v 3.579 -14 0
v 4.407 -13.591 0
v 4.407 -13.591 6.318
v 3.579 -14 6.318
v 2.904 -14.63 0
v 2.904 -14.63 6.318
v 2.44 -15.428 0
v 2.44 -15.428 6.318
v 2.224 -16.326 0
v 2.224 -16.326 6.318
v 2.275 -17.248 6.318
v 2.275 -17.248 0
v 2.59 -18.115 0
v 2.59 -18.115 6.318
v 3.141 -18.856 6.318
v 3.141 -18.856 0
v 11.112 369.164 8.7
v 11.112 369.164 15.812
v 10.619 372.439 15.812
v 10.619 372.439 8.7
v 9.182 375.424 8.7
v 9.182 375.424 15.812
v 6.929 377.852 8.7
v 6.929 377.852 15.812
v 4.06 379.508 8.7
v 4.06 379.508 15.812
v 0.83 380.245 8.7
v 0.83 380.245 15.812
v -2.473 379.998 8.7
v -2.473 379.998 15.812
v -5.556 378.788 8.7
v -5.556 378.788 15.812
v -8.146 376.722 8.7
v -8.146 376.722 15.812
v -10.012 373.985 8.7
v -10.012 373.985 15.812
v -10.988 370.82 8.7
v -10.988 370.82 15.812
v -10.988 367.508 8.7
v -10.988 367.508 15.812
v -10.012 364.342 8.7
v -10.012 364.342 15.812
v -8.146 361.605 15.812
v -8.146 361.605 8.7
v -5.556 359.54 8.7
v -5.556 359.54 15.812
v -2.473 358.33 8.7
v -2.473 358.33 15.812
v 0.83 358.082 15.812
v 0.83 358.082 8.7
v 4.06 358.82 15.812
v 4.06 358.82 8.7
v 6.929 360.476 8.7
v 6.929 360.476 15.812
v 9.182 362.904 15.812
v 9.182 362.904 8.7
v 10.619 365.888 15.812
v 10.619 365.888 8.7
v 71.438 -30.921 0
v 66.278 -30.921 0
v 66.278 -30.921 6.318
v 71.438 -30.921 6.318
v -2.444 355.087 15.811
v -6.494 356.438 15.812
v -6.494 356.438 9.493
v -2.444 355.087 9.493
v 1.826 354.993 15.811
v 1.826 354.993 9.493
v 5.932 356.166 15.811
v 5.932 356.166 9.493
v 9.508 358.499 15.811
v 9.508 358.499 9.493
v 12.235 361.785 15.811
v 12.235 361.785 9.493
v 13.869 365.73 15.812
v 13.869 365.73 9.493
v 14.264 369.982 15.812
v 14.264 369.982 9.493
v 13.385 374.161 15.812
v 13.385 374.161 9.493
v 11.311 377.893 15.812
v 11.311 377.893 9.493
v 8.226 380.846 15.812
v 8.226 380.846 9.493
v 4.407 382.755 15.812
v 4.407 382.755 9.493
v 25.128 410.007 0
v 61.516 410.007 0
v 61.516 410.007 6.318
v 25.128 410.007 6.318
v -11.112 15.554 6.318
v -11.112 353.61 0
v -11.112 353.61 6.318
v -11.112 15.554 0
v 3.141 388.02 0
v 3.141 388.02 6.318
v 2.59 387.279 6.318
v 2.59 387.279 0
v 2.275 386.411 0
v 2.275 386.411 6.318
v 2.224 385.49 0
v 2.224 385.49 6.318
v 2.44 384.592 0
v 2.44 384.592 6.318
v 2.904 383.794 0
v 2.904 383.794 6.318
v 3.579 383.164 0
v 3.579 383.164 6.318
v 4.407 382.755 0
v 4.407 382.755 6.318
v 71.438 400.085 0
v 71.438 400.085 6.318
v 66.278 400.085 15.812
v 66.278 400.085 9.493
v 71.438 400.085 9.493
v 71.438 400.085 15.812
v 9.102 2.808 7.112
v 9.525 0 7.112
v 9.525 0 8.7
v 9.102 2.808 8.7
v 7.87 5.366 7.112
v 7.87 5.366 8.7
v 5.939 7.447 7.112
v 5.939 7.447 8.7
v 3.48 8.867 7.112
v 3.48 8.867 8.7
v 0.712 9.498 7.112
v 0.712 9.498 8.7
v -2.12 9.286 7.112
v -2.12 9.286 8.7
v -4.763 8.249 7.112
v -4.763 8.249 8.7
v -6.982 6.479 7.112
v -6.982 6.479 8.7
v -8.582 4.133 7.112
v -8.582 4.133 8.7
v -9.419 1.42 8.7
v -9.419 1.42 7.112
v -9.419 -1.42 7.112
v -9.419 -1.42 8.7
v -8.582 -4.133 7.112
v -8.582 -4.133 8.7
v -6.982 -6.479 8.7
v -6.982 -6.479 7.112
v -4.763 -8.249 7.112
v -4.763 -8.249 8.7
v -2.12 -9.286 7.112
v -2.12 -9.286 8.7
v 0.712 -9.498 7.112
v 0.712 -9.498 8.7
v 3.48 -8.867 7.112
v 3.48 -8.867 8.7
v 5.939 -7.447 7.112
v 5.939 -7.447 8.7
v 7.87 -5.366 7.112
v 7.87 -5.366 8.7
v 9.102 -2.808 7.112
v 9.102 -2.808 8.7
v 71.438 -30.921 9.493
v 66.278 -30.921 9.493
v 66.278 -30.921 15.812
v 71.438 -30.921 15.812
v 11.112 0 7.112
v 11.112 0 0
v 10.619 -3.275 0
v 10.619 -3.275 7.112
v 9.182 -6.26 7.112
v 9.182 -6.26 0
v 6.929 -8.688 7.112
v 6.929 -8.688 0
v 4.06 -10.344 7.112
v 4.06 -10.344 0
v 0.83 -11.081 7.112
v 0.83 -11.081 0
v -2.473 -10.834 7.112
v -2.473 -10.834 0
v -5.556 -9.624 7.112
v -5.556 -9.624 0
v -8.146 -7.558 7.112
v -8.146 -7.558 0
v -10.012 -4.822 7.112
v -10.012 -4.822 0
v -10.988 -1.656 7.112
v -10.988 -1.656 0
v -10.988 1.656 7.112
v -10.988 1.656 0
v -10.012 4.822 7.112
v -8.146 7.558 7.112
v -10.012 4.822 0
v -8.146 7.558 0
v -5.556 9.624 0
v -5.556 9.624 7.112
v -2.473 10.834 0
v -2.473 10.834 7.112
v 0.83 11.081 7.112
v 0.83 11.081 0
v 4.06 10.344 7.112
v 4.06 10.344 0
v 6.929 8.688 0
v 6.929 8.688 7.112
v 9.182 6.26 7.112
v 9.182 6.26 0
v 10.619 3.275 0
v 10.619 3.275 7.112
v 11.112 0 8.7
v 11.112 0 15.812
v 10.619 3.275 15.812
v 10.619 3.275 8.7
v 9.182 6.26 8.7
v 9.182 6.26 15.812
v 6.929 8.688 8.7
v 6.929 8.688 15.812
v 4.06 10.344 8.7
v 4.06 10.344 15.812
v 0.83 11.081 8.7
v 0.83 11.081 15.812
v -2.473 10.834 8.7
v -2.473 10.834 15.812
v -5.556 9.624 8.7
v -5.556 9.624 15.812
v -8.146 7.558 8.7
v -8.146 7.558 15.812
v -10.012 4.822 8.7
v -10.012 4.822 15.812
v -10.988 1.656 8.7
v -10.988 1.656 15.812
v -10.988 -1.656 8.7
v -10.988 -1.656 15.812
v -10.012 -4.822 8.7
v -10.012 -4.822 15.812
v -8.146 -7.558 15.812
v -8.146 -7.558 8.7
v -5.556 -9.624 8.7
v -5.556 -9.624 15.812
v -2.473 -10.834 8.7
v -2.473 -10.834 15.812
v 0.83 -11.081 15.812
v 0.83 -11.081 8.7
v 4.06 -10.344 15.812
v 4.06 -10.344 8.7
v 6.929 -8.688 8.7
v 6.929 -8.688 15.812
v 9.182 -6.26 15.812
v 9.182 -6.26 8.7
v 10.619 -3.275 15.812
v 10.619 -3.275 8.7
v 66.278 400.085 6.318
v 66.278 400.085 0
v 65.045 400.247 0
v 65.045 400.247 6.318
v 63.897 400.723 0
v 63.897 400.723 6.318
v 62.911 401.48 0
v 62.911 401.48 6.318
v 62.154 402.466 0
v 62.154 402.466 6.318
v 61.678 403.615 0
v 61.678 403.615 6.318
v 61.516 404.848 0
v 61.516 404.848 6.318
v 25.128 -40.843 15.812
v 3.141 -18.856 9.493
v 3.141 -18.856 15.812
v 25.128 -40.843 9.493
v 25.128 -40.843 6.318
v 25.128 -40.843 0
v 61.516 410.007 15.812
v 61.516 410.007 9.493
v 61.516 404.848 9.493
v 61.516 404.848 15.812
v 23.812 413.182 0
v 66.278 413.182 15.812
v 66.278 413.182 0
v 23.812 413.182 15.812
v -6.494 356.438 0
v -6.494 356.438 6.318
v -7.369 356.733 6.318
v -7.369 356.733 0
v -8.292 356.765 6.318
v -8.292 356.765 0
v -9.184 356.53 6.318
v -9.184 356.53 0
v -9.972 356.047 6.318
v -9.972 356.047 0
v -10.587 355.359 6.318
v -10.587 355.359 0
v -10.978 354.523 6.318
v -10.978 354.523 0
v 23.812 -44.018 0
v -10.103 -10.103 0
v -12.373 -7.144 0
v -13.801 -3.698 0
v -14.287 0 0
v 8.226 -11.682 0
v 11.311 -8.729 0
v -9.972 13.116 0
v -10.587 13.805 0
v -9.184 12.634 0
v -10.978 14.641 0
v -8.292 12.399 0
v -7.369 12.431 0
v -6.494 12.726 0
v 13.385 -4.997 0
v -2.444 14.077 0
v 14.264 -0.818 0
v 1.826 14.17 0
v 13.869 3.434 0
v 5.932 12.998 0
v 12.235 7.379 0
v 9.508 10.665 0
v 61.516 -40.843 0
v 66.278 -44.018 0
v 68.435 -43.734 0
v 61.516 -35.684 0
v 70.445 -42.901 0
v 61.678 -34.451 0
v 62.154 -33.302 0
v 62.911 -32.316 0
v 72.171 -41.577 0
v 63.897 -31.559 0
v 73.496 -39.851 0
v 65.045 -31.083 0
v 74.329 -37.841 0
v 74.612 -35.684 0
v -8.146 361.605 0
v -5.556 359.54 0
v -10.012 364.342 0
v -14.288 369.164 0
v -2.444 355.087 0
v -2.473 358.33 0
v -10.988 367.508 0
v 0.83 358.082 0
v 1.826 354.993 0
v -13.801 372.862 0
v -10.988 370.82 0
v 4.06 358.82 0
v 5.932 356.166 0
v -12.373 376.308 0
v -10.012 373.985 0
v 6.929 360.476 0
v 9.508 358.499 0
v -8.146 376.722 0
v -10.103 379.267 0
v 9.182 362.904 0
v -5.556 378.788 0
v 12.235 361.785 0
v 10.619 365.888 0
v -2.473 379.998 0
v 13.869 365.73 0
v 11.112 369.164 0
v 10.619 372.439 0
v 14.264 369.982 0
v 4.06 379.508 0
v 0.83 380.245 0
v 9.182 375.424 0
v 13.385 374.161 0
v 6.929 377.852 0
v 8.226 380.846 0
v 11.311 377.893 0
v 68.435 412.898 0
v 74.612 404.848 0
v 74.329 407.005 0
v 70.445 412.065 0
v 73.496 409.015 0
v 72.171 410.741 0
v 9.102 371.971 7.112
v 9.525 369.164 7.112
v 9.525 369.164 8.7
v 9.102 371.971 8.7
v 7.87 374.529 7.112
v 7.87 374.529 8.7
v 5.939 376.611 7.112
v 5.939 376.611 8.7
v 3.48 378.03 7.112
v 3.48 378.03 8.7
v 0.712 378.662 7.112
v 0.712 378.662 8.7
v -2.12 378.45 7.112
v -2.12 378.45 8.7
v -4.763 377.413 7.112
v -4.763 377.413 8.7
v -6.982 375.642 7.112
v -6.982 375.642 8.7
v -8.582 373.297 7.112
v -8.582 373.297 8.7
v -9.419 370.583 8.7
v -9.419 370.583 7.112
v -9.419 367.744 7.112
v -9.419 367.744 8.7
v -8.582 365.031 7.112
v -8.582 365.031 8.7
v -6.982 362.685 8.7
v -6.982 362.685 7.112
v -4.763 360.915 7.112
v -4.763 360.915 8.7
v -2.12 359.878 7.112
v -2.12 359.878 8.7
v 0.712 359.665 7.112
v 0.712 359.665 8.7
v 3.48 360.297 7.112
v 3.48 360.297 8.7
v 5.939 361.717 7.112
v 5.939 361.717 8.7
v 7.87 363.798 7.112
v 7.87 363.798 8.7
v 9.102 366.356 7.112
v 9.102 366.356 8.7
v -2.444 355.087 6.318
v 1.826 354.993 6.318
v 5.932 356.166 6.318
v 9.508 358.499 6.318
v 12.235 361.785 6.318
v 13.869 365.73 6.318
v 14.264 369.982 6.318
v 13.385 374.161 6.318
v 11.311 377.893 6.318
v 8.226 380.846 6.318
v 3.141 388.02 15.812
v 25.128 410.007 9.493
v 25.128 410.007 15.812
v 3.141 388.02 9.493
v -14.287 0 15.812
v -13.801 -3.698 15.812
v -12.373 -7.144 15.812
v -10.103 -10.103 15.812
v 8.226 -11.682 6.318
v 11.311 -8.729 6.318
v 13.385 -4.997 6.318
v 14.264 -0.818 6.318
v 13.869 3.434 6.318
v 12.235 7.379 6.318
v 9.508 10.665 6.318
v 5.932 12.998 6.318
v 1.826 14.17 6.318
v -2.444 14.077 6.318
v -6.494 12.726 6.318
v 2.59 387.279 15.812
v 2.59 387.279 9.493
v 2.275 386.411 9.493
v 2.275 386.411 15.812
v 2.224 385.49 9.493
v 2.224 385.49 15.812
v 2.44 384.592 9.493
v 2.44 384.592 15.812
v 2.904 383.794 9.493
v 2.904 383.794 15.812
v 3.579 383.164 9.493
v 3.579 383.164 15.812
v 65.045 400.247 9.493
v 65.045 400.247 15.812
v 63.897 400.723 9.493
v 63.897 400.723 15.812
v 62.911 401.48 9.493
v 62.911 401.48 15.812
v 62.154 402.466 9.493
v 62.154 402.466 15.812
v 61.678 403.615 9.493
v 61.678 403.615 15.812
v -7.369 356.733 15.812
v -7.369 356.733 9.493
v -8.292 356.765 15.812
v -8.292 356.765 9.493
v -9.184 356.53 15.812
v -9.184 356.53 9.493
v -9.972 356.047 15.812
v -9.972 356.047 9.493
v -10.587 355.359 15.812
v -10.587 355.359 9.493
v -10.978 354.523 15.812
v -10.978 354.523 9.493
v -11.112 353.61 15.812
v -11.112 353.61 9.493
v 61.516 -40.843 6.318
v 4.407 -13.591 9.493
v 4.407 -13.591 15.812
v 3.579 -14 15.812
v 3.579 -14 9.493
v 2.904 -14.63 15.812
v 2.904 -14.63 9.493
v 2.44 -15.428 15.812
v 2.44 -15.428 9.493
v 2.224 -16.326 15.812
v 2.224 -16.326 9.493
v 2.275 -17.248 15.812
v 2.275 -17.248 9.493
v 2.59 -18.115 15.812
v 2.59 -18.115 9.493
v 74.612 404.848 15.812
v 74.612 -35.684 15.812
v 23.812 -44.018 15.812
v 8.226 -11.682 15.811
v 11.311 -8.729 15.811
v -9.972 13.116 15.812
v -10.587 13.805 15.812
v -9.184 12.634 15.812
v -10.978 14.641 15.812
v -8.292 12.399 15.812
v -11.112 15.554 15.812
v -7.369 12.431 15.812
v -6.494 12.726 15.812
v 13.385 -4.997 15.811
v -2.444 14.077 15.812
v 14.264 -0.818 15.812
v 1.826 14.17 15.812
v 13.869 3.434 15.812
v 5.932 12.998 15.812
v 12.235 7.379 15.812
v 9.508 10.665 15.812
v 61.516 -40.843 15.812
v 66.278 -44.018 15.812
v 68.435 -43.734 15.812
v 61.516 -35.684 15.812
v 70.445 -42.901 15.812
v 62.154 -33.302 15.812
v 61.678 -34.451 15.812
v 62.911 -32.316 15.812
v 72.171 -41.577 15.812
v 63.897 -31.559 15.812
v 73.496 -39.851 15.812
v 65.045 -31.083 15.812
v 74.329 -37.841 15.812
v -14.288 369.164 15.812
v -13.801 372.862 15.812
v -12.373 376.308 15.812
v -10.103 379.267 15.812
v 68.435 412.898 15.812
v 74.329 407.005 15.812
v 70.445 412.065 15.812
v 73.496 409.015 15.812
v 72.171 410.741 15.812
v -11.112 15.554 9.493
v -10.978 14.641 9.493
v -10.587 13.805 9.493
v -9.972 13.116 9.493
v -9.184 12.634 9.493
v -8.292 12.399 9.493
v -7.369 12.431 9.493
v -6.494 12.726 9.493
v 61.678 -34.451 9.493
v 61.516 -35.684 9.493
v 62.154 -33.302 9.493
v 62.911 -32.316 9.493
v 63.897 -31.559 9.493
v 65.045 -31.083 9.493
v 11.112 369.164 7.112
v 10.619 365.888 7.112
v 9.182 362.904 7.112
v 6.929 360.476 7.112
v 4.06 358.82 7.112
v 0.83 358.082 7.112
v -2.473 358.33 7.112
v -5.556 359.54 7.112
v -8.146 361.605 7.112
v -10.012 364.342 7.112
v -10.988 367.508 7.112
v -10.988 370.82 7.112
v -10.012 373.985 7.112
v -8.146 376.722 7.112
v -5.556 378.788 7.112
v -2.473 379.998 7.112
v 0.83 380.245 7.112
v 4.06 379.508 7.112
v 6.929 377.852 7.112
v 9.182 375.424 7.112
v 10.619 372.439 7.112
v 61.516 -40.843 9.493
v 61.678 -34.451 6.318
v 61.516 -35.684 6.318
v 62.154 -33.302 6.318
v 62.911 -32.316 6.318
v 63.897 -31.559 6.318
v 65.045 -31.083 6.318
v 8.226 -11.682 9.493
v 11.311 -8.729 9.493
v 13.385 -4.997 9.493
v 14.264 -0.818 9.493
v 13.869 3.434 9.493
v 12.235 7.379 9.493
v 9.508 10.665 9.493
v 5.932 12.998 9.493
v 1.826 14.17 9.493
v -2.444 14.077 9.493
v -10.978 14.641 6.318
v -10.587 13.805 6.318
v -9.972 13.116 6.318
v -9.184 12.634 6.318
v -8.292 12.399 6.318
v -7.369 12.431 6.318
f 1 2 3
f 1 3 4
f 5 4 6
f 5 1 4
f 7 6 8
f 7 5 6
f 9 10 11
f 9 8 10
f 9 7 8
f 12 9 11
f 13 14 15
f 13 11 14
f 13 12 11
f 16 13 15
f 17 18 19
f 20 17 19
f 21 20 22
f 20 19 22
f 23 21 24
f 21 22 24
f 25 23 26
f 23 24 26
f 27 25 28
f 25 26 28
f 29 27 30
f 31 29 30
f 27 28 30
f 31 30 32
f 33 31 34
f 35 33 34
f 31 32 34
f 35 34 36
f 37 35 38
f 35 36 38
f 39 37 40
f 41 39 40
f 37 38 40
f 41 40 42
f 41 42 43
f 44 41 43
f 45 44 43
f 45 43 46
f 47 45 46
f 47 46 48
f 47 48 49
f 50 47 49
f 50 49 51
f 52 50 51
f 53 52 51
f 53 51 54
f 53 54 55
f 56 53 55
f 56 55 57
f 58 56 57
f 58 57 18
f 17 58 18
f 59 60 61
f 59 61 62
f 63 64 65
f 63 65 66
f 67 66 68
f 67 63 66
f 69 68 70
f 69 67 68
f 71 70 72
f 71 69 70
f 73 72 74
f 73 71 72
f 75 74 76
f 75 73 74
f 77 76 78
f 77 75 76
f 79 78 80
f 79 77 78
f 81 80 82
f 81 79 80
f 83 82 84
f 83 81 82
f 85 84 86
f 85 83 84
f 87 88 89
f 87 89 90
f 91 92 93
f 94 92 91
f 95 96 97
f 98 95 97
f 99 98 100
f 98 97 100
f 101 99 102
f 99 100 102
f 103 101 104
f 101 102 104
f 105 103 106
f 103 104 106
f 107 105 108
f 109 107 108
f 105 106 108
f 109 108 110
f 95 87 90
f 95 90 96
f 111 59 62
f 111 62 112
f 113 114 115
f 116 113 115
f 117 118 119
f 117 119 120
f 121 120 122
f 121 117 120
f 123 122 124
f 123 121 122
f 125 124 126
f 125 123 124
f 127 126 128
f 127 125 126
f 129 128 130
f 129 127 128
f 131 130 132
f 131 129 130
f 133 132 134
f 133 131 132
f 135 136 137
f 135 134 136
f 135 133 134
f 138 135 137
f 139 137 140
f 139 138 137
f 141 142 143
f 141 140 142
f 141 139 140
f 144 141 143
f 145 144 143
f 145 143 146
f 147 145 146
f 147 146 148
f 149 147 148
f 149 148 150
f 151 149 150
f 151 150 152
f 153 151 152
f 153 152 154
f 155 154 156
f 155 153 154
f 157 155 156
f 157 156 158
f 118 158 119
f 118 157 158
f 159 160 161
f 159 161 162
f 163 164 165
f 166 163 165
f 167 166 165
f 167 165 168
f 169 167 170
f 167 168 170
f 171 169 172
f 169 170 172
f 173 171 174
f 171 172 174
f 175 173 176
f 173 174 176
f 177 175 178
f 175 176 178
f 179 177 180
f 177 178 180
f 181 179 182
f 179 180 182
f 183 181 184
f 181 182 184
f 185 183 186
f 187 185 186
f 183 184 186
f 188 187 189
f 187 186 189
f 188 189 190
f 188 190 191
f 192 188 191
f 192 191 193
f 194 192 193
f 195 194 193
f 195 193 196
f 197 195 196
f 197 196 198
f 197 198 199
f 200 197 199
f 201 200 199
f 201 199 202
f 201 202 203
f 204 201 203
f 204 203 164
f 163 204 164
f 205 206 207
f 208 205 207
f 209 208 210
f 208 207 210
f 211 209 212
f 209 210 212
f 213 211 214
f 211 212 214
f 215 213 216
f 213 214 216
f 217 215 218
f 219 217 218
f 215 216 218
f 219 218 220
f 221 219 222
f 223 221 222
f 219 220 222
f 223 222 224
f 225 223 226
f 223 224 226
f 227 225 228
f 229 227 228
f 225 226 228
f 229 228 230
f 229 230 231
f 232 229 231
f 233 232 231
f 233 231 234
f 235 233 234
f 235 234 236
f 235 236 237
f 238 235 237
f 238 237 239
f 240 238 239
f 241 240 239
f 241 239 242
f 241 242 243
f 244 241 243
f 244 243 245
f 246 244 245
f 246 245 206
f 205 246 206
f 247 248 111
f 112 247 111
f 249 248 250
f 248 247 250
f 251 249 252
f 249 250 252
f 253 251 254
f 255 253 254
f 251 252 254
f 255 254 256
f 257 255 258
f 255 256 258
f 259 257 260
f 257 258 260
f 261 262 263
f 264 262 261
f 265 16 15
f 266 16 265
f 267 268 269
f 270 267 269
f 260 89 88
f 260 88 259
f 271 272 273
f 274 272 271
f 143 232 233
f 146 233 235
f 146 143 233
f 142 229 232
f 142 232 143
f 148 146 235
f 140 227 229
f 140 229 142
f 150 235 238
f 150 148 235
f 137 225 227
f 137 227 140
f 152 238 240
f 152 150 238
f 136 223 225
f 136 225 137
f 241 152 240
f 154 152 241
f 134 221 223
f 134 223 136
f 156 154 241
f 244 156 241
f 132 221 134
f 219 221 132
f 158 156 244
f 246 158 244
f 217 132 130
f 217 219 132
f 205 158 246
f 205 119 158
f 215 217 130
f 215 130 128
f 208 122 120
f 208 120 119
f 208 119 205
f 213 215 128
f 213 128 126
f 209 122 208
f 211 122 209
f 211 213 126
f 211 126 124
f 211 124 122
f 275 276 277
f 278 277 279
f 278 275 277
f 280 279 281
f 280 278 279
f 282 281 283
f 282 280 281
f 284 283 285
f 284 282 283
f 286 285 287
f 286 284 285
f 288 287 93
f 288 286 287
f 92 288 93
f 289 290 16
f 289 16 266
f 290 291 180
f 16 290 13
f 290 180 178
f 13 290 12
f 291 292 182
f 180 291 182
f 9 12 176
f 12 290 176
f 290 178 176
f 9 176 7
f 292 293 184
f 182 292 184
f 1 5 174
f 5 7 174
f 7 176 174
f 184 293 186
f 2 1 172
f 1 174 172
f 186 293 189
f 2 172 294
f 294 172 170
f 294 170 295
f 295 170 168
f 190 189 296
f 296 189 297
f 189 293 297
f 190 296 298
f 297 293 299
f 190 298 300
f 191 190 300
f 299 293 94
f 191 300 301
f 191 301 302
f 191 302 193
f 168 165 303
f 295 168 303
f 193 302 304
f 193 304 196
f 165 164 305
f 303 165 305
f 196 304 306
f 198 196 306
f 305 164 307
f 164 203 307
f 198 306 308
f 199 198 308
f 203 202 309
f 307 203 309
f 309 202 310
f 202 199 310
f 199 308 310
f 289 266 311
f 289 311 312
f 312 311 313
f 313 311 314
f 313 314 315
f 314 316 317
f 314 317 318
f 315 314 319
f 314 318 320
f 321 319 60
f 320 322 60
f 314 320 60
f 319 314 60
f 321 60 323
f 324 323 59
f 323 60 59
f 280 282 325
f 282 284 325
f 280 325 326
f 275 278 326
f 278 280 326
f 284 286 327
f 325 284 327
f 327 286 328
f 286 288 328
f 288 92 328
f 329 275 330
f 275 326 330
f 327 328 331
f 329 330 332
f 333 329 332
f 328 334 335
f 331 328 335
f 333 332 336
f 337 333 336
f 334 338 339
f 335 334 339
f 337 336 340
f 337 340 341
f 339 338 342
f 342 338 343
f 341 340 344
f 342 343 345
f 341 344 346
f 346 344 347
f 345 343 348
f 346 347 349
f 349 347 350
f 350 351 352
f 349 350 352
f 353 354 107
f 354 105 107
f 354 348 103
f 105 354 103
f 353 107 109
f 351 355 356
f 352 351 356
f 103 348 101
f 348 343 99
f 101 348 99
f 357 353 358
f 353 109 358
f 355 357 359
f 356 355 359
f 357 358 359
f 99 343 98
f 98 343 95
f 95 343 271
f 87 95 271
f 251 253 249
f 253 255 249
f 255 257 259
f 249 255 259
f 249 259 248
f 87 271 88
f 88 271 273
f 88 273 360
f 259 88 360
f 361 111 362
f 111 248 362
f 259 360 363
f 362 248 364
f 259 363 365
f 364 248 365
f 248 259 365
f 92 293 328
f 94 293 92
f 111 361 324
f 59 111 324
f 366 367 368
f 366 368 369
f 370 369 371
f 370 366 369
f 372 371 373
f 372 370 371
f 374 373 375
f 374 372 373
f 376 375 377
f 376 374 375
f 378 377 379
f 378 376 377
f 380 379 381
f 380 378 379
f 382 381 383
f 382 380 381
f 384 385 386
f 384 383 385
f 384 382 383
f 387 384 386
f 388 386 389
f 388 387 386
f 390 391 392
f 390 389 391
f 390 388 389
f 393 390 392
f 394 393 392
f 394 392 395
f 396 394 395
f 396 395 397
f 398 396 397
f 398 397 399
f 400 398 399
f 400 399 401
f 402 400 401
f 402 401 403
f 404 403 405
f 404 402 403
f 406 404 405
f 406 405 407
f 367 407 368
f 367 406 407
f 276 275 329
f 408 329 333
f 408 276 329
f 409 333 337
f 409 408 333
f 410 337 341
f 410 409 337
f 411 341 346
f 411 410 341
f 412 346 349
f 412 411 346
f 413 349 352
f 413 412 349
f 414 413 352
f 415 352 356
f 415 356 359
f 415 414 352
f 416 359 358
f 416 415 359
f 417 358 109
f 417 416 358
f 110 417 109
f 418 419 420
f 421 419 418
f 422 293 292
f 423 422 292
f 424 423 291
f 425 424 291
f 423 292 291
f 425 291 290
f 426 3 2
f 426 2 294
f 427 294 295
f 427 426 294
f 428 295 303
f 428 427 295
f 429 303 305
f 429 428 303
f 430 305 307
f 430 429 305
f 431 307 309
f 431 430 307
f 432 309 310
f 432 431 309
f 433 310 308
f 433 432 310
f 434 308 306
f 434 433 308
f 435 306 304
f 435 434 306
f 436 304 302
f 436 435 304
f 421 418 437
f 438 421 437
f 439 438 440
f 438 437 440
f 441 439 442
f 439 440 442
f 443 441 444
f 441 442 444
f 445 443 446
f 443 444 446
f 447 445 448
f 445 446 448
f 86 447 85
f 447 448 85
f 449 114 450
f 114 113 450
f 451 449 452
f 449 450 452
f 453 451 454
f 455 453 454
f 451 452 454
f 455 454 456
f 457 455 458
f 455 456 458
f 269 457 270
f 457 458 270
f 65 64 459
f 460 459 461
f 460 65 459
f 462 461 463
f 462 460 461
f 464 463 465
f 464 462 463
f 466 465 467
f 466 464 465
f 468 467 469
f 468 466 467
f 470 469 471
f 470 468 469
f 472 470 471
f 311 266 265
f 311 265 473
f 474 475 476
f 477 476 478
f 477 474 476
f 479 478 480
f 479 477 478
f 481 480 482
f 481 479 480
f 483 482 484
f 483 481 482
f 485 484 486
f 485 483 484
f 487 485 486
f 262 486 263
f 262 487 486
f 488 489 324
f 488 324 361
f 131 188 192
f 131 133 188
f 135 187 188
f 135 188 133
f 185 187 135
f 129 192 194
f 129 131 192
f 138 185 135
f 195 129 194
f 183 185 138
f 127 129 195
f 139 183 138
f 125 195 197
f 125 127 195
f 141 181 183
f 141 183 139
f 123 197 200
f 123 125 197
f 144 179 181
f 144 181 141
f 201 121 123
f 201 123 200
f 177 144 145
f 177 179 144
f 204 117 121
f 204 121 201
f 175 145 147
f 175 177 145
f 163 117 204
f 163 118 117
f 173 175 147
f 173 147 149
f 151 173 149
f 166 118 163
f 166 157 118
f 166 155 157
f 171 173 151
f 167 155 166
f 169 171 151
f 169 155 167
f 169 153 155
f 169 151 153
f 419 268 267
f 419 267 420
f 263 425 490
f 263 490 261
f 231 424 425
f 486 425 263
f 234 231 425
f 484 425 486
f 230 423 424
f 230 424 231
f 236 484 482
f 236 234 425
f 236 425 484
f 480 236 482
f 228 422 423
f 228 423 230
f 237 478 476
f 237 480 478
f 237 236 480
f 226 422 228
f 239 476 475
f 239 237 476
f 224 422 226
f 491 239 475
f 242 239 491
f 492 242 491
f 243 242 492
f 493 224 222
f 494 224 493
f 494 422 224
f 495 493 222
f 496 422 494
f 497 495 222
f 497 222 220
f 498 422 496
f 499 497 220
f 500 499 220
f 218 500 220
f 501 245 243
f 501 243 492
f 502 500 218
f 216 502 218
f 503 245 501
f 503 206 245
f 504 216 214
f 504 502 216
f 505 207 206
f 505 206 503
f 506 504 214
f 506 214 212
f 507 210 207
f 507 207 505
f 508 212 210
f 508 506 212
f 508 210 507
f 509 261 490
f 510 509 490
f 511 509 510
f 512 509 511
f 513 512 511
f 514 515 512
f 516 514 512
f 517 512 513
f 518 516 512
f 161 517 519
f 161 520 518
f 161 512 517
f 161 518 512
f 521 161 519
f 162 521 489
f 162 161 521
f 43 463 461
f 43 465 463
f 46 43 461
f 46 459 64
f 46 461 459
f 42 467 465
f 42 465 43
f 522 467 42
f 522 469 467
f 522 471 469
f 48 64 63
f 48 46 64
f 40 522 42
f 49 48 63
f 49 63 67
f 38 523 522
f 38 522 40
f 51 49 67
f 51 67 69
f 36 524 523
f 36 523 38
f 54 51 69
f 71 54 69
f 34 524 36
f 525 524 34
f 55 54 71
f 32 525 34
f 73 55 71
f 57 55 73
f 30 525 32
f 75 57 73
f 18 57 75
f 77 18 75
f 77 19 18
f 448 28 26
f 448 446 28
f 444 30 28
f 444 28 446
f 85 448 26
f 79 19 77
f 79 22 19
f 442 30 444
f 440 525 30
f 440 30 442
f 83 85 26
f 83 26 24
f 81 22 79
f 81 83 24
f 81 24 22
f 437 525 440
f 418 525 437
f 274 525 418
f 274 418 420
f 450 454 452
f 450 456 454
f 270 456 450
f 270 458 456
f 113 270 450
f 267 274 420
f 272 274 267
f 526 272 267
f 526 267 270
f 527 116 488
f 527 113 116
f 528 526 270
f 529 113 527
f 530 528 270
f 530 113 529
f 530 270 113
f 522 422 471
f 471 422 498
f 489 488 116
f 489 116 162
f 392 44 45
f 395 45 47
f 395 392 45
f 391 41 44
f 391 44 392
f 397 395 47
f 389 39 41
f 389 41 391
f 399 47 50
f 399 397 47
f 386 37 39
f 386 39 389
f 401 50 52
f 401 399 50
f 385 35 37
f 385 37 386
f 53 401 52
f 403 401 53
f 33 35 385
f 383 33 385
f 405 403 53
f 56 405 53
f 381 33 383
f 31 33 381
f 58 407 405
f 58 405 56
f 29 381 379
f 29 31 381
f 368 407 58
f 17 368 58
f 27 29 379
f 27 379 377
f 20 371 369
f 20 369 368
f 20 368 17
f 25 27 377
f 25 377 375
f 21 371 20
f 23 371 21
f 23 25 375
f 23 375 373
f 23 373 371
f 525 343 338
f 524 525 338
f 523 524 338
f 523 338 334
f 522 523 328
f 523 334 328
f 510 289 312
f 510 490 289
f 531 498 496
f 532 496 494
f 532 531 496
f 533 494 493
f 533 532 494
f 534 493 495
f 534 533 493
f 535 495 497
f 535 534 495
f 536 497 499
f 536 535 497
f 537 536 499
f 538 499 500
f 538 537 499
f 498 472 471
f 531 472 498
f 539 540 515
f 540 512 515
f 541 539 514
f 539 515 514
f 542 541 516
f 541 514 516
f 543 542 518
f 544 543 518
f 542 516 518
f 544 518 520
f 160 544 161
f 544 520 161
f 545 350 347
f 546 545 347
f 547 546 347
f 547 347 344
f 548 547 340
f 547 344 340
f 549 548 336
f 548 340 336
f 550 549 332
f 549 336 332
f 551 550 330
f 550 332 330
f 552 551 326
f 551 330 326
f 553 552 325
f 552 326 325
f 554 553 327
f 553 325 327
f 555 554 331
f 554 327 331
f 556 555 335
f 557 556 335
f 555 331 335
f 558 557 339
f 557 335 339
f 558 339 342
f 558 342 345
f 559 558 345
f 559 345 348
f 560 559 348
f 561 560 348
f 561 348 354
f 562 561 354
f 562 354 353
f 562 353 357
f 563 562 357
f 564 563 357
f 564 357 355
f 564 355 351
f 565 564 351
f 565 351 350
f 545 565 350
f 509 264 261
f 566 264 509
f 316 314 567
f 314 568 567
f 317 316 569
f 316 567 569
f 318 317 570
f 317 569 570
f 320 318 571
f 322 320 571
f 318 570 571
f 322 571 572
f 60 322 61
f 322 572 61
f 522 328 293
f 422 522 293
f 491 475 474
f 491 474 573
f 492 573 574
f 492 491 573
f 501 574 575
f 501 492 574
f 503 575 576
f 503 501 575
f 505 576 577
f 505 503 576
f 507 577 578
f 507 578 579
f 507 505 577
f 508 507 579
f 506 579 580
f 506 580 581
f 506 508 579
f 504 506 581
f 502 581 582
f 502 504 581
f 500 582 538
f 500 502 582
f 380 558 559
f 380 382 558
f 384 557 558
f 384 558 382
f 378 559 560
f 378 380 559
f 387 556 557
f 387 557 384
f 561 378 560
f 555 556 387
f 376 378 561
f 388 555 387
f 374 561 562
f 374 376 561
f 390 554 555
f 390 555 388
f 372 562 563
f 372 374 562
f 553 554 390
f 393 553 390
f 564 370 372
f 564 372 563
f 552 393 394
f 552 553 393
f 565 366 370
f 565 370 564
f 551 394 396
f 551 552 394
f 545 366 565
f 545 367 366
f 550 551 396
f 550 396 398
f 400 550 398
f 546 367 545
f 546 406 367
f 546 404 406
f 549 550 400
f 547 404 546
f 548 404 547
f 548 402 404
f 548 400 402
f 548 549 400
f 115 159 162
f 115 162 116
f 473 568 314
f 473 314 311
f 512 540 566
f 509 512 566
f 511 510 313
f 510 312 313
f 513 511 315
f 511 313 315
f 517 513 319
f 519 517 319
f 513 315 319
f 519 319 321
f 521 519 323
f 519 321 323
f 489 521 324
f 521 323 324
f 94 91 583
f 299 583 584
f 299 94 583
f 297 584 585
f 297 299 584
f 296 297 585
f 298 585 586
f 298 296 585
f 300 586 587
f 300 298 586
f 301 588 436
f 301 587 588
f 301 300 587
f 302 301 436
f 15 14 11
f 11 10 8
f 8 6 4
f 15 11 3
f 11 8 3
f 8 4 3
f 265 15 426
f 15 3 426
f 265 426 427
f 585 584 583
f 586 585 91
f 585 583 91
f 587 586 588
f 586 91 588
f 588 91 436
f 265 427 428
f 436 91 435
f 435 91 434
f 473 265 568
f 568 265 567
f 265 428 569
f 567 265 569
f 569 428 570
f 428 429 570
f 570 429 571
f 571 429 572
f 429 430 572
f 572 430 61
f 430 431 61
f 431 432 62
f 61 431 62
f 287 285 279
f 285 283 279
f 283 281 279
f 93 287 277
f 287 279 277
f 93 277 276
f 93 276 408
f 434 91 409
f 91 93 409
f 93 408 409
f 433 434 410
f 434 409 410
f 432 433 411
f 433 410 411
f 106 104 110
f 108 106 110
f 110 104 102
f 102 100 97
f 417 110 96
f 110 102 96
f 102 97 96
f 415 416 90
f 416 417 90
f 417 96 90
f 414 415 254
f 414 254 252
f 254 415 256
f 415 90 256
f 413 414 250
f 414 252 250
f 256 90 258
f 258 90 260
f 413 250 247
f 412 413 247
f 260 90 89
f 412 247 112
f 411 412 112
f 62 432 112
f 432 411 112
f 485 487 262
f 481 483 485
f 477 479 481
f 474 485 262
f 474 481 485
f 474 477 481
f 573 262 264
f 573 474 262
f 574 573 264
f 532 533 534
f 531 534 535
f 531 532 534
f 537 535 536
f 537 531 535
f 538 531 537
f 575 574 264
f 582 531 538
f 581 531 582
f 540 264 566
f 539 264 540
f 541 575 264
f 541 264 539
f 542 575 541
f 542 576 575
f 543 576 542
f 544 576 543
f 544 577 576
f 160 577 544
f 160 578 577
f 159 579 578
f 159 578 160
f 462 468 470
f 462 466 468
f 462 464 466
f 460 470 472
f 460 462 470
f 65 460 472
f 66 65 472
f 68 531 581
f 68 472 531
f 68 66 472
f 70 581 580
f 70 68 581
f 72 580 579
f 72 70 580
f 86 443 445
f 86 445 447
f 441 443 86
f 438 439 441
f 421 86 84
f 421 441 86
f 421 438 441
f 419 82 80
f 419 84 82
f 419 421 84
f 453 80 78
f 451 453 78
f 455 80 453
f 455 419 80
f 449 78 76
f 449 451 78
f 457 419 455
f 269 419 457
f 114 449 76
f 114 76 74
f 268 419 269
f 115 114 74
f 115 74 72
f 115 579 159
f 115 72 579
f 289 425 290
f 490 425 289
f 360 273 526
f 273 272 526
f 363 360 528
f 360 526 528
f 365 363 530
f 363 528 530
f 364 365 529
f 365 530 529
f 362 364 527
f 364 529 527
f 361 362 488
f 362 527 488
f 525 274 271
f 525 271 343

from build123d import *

# Parameters (mm, degrees)
F0_R      = 9.525
F1_DEPTH  = 15.8115
F2_R      = 11.1125
F3_DEPTH  = 7.112
F4_R      = 11.1125
F5_DEPTH  = 7.112
F6_T      = 3.175
F7_R      = 3.175
F8_DEPTH  = 3.175
F10_R     = 11.1125
F11_DEPTH = 1.5875
F12_W     = 13.096875
F12_H     = 13.096875
F13_DEPTH = 15.8115
F14_R     = 4.7625
F15_R     = 8.334375


# Not quite as in the source:
# - a shell that OpenCascade refuses in one call is made with other operations: the cavity is built on its own and cut out


with BuildPart() as f1:
    # F0 (on Top) → F1 (new body)
    with BuildSketch(Plane.XY):
        with BuildLine():
            Line((-14.2875, 369.1638474552), (-14.2875, 0))
            ThreePointArc((-14.2875, 0), (-13.1999288208, -5.4675895399), (-10.1027881362, -10.1027881362))
            Line((-10.1027881362, -10.1027881362), (23.8125, -44.0180762724))
            Line((23.8125, -44.0180762724), (74.6125, -44.0180762724))
            Line((74.6125, -44.0180762724), (74.6125, 413.1819237276))
            Line((74.6125, 413.1819237276), (23.8125, 413.1819237276))
            Line((23.8125, 413.1819237276), (-10.1027881362, 379.2666355914))
            ThreePointArc((-10.1027881362, 379.2666355914), (-13.1999288208, 374.6314369951), (-14.2875, 369.1638474552))
        make_face()
        Circle(F0_R, mode=Mode.SUBTRACT)
        with Locations((0, 369.1638474552)):
            Circle(F0_R, mode=Mode.SUBTRACT)
    extrude(amount=F1_DEPTH)

    # F2 (on face) → F3 (cut)
    with BuildSketch(Plane.XY.offset(15.8115)):
        with Locations((0, 369.1638474552)):
            Circle(F2_R)
        Circle(F2_R)
    extrude(amount=-F3_DEPTH, mode=Mode.SUBTRACT)

    # F4 (on face) → F5 (cut)
    with BuildSketch(Plane(origin=(0, 0, 0), x_dir=(1, 0, 0), z_dir=(0, 0, -1))):
        Circle(F4_R)
        with Locations((0, -369.1638474552)):
            Circle(F4_R)
    extrude(amount=-F5_DEPTH, mode=Mode.SUBTRACT)

    # F6: shell of thickness 3.175, made by hand


with BuildPart() as f6_core1:
    # F6_t2: copy of F1
    add(f1.part)

    # the walls: a layer under each face that stays
    f6_faces = [f6_core1.faces().sort_by_distance(p)[0] for p in [
        (-13.1999288208, 374.6314369951, 7.90575),
        (6.8548559319, 396.2242796595, 7.90575),
        (-14.2875, 184.5819237276, 7.90575),
        (30.1625, 184.5819237276, 15.8115),
        (49.2125, 413.1819237276, 7.90575),
        (-13.1999288208, -5.4675895399, 7.90575),
        (74.6125, 184.5819237276, 7.90575),
        (6.8548559319, -27.0604322043, 7.90575),
        (49.2125, -44.0180762724, 7.90575),
        (-11.1125, 0, 3.556),
        (-11.1125, 369.1638474552, 3.556),
        (-11.1125, 0, 12.2555),
        (-11.1125, 369.1638474552, 12.2555),
        (-7.4083333333, 7.4083333333, 7.112),
        (-7.4083333333, 376.5721807885, 7.112),
        (-7.4083333333, -7.4083333333, 8.6995),
        (-7.4083333333, 361.7555141219, 8.6995),
        (-9.525, 0, 7.90575),
        (-9.525, 369.1638474552, 7.90575),
    ]]
    thicken(f6_faces, amount=-F6_T, mode=Mode.SUBTRACT)

    # F6_s3 → F6_t4 (revolve, cut)
    with BuildSketch(Plane.XZ):
        Polygon((11.08075, 7.08025), (14.2875, 7.112), (14.2875, 10.287), (11.1125, 10.287), align=None)
    revolve(axis=Axis((0, 0, 7.112), (0, 0, -1)), mode=Mode.SUBTRACT)

    # F6_s5 → F6_t6 (revolve, cut)
    with BuildSketch(Plane.XZ.offset(-369.1638474552)):
        Polygon((11.08075, 7.08025), (14.2875, 7.112), (14.2875, 10.287), (11.1125, 10.287), align=None)
    revolve(axis=Axis((0, 369.1638474552, 7.112), (0, 0, -1)), mode=Mode.SUBTRACT)

    # F6_s7 → F6_t8 (revolve, cut)
    with BuildSketch(Plane.XZ):
        Polygon((11.08075, 8.73125), (14.2875, 8.6995), (14.2875, 5.5245), (11.1125, 5.5245), align=None)
    revolve(axis=Axis((0, 0, 8.6995), (0, 0, 1)), mode=Mode.SUBTRACT)

    # F6_s9 → F6_t10 (revolve, cut)
    with BuildSketch(Plane.XZ.offset(-369.1638474552)):
        Polygon((11.08075, 8.73125), (14.2875, 8.6995), (14.2875, 5.5245), (11.1125, 5.5245), align=None)
    revolve(axis=Axis((0, 369.1638474552, 8.6995), (0, 0, 1)), mode=Mode.SUBTRACT)


with BuildPart() as f1_1:
    add(f1.part)

    # what is left inside the walls is the cavity
    f6_cavity = [f6_core1.part.solids().sort_by_distance(p)[0] for p in [
        (30.1625, 109.440257, 12.60475),
    ]]
    add(f6_cavity, mode=Mode.SUBTRACT)

    # F7
    f7_edges = [f1_1.edges().sort_by_distance(p)[0] for p in [
        (-1.507724, 383.371572, 6.31825),
        (-11.1125, 360.183591, 6.31825),
        (-11.1125, 8.980256, 6.31825),
        (-1.507724, -14.207724, 6.31825),
    ]]
    fillet(f7_edges, radius=F7_R)

    # F8 (cut, through all): a face of the model
    f8_faces = [f1_1.faces().sort_by_distance(p)[0] for p in [
        (32.2546535053, 184.5819237276, 12.6365),
    ]]
    extrude(f8_faces, amount=-F8_DEPTH, mode=Mode.SUBTRACT)

    # F10 (on offset) → F11 (join, symmetric)
    with BuildSketch(Plane.XY.offset(7.90575)):
        with BuildLine():
            Line((74.6125, -44.0180762724), (74.6125, 413.1819237276))
            Line((74.6125, 413.1819237276), (23.8125, 413.1819237276))
            Line((23.8125, 413.1819237276), (-10.1027881362, 379.2666355914))
            ThreePointArc((-10.1027881362, 379.2666355914), (-13.1999288208, 374.6314369951), (-14.2875, 369.1638474552))
            Line((-14.2875, 369.1638474552), (-14.2875, 0))
            ThreePointArc((-14.2875, 0), (-13.1999288208, -5.4675895399), (-10.1027881362, -10.1027881362))
            Line((-10.1027881362, -10.1027881362), (23.8125, -44.0180762724))
            Line((23.8125, -44.0180762724), (74.6125, -44.0180762724))
        make_face()
        Circle(F10_R, mode=Mode.SUBTRACT)
        with Locations((0, 369.1638474552)):
            Circle(F10_R, mode=Mode.SUBTRACT)
    extrude(amount=F11_DEPTH, both=True)

    # F12 (on face) → F13 (join, through all)
    with BuildSketch(Plane(origin=(0, 0, 0), x_dir=(1, 0, 0), z_dir=(0, 0, -1))):
        with Locations((68.0640625, -406.6334862276)):
            Rectangle(F12_W, F12_H)
        with Locations((68.0640625, 37.4696387724)):
            Rectangle(F12_W, F12_H)
    extrude(amount=-F13_DEPTH)

    # F14
    f14_edges = [f1_1.edges().sort_by_distance(p)[0] for p in [
        (61.515625, 400.085049, 12.652375),
        (61.515625, 400.085049, 3.159125),
        (61.515625, -30.921201, 12.652375),
        (61.515625, -30.921201, 3.159125),
    ]]
    fillet(f14_edges, radius=F14_R)

    # F15
    f15_edges = [f1_1.edges().sort_by_distance(p)[0] for p in [
        (74.6125, -44.018076, 7.90575),
        (74.6125, 413.181924, 7.90575),
    ]]
    fillet(f15_edges, radius=F15_R)


solid = f1_1.part
